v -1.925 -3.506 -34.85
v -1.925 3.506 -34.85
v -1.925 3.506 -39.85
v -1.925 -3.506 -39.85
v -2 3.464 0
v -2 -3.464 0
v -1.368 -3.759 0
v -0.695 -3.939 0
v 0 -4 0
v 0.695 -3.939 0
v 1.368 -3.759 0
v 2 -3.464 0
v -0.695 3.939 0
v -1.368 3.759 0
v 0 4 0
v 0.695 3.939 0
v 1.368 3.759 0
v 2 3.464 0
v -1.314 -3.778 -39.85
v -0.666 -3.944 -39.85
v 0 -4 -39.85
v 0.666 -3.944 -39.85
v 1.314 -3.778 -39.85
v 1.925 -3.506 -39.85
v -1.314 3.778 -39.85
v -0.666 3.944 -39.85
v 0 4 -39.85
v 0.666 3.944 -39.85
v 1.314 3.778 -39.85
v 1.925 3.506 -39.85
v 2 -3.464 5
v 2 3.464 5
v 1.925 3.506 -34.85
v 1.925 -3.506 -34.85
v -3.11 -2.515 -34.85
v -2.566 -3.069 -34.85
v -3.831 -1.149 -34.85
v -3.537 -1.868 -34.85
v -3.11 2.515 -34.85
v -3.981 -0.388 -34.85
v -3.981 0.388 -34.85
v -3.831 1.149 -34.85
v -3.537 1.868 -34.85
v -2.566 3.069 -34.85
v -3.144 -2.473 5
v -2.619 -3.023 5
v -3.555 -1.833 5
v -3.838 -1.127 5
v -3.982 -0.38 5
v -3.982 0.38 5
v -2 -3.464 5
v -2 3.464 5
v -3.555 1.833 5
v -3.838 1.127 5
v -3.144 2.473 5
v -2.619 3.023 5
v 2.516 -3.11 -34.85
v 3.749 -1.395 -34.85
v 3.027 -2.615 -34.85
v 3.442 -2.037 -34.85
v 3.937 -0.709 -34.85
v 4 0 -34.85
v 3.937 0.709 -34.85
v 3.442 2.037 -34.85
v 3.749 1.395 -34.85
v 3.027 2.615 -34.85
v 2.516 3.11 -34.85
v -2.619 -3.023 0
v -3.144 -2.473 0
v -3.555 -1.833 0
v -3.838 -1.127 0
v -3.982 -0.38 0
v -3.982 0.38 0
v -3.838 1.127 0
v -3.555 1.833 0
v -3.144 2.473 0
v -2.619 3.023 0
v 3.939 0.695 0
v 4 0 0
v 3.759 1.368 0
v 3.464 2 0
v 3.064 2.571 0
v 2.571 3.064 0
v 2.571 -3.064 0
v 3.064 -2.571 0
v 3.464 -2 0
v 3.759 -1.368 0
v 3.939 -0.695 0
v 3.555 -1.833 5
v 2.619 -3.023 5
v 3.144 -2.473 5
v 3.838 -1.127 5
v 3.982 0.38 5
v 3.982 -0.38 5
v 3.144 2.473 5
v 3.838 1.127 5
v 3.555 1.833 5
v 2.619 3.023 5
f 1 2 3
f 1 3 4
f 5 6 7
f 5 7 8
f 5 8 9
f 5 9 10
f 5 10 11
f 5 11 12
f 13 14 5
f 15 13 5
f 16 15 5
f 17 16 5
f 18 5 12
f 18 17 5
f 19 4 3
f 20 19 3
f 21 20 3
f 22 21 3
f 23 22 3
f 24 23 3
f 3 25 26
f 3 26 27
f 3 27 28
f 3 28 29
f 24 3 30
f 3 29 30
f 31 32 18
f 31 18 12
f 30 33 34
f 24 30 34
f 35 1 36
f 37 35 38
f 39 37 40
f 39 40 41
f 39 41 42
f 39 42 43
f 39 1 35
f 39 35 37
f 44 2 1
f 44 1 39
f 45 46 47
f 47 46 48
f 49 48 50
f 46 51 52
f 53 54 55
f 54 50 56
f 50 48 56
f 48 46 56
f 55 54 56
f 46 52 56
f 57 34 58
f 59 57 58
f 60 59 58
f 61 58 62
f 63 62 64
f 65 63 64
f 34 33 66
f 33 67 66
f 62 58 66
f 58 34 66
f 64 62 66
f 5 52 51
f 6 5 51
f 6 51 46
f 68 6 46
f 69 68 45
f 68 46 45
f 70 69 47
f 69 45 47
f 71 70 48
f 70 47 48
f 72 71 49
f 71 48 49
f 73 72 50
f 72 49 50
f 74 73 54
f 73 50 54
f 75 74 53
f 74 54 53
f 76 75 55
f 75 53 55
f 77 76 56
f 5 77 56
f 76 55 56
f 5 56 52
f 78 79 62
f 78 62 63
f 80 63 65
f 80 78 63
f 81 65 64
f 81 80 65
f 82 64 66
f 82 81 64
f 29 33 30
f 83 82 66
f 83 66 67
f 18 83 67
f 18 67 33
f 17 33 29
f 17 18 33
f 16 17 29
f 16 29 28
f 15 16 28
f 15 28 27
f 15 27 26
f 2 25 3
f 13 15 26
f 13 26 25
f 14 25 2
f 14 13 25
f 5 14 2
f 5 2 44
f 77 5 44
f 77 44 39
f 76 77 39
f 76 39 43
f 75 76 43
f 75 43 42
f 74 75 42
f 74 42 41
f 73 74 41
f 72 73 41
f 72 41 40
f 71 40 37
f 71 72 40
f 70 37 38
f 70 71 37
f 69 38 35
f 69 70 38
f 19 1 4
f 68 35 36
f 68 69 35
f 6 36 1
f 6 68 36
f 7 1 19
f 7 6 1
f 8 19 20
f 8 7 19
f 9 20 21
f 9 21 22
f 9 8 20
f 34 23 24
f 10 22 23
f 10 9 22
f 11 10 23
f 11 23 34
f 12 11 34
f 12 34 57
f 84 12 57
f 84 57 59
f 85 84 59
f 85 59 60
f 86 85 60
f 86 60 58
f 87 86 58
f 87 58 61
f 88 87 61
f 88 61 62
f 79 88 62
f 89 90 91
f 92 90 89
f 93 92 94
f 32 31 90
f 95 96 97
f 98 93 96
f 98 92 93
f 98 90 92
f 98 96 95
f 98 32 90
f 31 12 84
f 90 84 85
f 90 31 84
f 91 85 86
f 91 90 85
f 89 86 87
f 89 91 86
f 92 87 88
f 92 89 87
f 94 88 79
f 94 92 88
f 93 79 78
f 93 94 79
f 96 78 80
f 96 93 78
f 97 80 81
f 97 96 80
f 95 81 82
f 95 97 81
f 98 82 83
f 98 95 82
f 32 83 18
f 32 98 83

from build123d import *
from build123d.topology import SkipClean

# Parameters (mm, degrees)
SKETCH1_R           = 4
BOSS_EXTRUDE1_DEPTH = 39.85
BOSS_EXTRUDE2_START = 5
BOSS_EXTRUDE2_DEPTH = 5
CUT_EXTRUDE1_START  = -5
CUT_EXTRUDE1_DEPTH  = 5


with BuildPart() as part:
    # Sketch1 → Boss-Extrude1 (new body)
    with BuildSketch(Plane.XY):
        Circle(SKETCH1_R)
    extrude(amount=-BOSS_EXTRUDE1_DEPTH)

    # Sketch2 → Boss-Extrude2 (add)
    with SkipClean():  # the faces are left unmerged after this step: merging them gives an invalid solid
        with BuildSketch(Plane.XY.offset(BOSS_EXTRUDE2_START)):
            with BuildLine():
                Line((-2, 3.464101615), (-2, -3.464101615))
                ThreePointArc((-2, -3.464101615), (-4, 0), (-2, 3.464101615))
            make_face()
            with BuildLine():
                Line((2, 3.464101615), (2, -3.464101615))
                ThreePointArc((2, -3.464101615), (4, 0), (2, 3.464101615))
            make_face()
        extrude(amount=-BOSS_EXTRUDE2_DEPTH)

    # Sketch3 → Cut-Extrude1 (cut)
    with SkipClean():  # the faces are left unmerged after this step: merging them gives an invalid solid
        with BuildSketch(Plane(origin=(0, 0, -39.85), x_dir=(-1, 0, 0), z_dir=(0, 0, -1)).offset(CUT_EXTRUDE1_START)):
            with BuildLine():
                Line((-1.925, 3.506333555), (-1.925, -3.506333555))
                ThreePointArc((-1.925, -3.506333555), (-4, 0), (-1.925, 3.506333555))
            make_face()
            with BuildLine():
                Line((1.925, 3.506333555), (1.925, -3.506333555))
                ThreePointArc((1.925, -3.506333555), (4, 0), (1.925, 3.506333555))
            make_face()
        extrude(amount=CUT_EXTRUDE1_DEPTH, mode=Mode.SUBTRACT)


solid = part.part
